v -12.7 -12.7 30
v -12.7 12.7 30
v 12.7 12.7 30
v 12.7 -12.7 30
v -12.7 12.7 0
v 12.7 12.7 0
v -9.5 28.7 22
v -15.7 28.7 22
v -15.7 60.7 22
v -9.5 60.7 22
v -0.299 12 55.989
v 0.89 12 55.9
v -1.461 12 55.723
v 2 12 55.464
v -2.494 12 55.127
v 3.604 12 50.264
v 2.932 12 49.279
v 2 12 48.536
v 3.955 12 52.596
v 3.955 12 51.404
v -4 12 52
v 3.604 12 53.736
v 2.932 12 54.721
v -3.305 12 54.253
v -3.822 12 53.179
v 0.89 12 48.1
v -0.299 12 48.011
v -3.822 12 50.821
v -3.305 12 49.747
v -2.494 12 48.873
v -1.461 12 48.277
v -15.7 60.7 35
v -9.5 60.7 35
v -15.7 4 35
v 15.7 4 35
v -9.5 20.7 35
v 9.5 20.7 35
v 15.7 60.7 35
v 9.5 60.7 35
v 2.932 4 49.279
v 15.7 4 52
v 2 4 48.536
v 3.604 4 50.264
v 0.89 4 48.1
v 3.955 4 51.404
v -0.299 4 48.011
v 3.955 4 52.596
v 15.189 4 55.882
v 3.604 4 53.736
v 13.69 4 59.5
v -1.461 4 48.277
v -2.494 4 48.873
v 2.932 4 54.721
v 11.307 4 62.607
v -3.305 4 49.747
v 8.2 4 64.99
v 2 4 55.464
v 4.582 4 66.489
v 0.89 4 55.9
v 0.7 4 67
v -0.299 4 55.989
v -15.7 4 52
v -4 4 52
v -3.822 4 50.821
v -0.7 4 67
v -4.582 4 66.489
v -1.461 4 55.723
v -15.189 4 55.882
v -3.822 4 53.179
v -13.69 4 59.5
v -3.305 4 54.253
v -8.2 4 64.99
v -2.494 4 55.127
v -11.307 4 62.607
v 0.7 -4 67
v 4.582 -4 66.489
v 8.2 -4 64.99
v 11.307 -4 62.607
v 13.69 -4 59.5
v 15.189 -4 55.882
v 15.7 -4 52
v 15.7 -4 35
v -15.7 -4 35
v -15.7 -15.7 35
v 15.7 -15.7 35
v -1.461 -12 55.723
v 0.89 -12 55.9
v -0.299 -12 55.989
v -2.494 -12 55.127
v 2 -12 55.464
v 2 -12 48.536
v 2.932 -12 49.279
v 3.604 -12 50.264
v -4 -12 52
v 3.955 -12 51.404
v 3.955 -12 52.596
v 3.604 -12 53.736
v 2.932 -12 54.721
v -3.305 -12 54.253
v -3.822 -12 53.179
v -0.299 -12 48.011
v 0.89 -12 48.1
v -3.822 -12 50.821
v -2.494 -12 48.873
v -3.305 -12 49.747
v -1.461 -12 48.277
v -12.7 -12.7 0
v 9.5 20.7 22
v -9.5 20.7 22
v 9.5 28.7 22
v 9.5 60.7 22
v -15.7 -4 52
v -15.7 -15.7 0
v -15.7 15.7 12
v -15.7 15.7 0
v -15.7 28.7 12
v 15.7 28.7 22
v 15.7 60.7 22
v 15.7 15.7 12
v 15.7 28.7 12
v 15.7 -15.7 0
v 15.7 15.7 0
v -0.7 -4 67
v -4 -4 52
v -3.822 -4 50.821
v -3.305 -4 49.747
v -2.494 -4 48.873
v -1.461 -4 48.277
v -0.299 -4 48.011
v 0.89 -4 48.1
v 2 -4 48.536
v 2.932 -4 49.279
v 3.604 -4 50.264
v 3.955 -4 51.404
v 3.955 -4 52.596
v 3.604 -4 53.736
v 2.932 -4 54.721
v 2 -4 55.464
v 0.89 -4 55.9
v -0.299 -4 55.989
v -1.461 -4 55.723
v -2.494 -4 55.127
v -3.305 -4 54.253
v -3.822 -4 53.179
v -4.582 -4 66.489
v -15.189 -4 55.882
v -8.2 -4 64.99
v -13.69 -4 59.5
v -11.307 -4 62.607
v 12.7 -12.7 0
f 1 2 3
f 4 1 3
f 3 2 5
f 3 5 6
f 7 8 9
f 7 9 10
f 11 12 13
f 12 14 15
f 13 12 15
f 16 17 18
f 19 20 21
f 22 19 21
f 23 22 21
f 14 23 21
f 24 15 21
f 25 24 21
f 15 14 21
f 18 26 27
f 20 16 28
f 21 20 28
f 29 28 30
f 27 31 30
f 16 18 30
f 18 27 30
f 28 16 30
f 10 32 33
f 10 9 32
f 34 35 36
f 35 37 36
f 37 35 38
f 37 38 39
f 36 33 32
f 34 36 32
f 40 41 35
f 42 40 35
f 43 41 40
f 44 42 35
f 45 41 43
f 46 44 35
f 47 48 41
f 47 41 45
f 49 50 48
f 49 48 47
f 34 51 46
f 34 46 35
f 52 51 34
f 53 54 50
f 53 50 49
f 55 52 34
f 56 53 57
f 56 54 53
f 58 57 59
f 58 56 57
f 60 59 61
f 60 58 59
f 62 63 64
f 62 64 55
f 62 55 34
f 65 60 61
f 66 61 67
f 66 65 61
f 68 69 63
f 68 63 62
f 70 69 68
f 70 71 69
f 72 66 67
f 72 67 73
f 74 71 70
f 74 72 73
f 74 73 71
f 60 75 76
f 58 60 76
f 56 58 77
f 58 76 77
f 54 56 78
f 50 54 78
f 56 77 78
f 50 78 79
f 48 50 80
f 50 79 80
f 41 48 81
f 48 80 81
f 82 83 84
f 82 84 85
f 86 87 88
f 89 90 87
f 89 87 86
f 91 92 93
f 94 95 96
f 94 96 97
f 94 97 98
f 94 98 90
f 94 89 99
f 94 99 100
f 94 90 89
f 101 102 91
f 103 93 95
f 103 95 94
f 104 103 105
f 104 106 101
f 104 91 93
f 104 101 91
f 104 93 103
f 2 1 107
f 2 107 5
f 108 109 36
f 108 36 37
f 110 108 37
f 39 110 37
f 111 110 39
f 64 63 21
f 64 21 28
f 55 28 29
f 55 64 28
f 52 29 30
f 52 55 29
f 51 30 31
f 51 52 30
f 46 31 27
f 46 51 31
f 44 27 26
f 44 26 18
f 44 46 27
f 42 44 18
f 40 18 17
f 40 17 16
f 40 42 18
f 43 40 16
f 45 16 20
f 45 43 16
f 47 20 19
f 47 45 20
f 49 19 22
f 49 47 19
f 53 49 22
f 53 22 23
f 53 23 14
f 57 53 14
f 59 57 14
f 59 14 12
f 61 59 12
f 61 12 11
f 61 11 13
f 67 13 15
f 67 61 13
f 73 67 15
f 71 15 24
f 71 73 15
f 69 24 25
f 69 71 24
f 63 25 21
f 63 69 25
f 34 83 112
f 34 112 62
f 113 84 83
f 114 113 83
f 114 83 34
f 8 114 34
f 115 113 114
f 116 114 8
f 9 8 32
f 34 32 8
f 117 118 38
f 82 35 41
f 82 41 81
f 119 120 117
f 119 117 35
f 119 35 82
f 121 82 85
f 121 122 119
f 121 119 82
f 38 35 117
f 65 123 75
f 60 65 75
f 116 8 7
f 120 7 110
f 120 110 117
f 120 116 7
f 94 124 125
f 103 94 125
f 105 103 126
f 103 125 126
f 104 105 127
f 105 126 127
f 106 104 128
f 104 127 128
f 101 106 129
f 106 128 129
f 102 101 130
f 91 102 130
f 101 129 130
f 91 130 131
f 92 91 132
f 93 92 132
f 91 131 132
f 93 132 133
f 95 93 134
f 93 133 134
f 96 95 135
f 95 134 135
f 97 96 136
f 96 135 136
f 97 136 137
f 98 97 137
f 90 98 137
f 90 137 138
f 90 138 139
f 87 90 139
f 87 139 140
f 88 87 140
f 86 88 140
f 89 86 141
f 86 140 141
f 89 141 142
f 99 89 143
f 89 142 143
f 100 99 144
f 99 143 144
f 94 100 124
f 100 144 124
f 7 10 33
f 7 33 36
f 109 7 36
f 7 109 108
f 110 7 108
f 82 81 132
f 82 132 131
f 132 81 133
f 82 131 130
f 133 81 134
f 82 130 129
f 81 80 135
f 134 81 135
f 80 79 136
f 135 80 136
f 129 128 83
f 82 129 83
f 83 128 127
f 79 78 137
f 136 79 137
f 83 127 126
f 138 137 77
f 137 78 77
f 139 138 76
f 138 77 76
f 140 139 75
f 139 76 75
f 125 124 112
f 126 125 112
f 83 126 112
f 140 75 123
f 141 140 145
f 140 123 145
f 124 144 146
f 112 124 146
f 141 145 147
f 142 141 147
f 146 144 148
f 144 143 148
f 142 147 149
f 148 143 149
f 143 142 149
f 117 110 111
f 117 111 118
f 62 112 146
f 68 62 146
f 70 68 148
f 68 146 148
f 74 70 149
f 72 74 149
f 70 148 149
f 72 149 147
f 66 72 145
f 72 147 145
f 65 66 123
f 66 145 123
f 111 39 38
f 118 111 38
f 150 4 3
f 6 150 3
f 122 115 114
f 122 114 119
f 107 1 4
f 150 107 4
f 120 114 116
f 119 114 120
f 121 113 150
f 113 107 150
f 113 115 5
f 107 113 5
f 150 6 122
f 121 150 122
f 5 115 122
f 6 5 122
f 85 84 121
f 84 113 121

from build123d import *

# Parameters (mm, degrees)
SKETCH4_W            = 31.4
SKETCH4_H            = 31.4
SKETCH4_W_2          = 25.4
SKETCH4_H_2          = 25.4
BOSS_EXTRUDE3_DEPTH  = 30
SKETCH5_W            = 31.4
SKETCH5_H            = 31.4
BOSS_EXTRUDE4_DEPTH  = 5
SKETCH6_W            = 31.4
SKETCH6_H            = 8
BOSS_EXTRUDE5_DEPTH  = 5
BOSS_EXTRUDE6_DEPTH  = 8
SKETCH8_R            = 4
BOSS_EXTRUDE7_DEPTH  = 8
SKETCH9_W            = 31.4
SKETCH9_H            = 10
BOSS_EXTRUDE8_DEPTH  = 5
SKETCH10_W           = 31.4
SKETCH10_H           = 10
BOSS_EXTRUDE9_DEPTH  = 13
SKETCH11_W           = 6.2
SKETCH11_H           = 10
BOSS_EXTRUDE10_DEPTH = 40
BOSS_EXTRUDE11_DEPTH = 3


with BuildPart() as part:
    # Sketch4 → Boss-Extrude3 (new body)
    with BuildSketch(Plane.XY):
        Rectangle(SKETCH4_W, SKETCH4_H)
        Rectangle(SKETCH4_W_2, SKETCH4_H_2, mode=Mode.SUBTRACT)
    extrude(amount=BOSS_EXTRUDE3_DEPTH)

    # Sketch5 → Boss-Extrude4 (add)
    with BuildSketch(Plane.XY.offset(30)):
        Rectangle(SKETCH5_W, SKETCH5_H)
    extrude(amount=BOSS_EXTRUDE4_DEPTH)

    # Sketch6 → Boss-Extrude5 (add)
    with BuildSketch(Plane.XY.offset(35)):
        Rectangle(SKETCH6_W, SKETCH6_H)
    extrude(amount=BOSS_EXTRUDE5_DEPTH)

    # Sketch7 → Boss-Extrude6 (add)
    with BuildSketch(Plane.XZ.offset(4)):
        with BuildLine():
            Line((-15.7, 40), (-15.7, 52))
            ThreePointArc((-15.7, 52), (-11.306601718, 62.606601718), (-0.7, 67))
            Line((-0.7, 67), (0.7, 67))
            ThreePointArc((0.7, 67), (11.306601718, 62.606601718), (15.7, 52))
            Line((15.7, 52), (15.7, 40))
            Line((15.7, 40), (-15.7, 40))
        make_face()
    extrude(amount=-BOSS_EXTRUDE6_DEPTH)

    # Sketch8 → Boss-Extrude7 (add)
    with BuildSketch(Plane.XZ.offset(4)):
        with Locations(Location((0, 52, 0), (0, 0, 180))):
            Circle(SKETCH8_R)
    boss_extrude7 = extrude(amount=BOSS_EXTRUDE7_DEPTH)

    # Mirror1: Boss-Extrude7 across plane
    add(boss_extrude7.mirror(Plane.ZX))

    # Sketch9 → Boss-Extrude8 (add)
    with BuildSketch(Plane(origin=(0, 15.7, 0), x_dir=(1, 0, 0), z_dir=(0, 1, 0))):
        with Locations((0, -27)):
            Rectangle(SKETCH9_W, SKETCH9_H)
    extrude(amount=BOSS_EXTRUDE8_DEPTH)

    # Sketch10 → Boss-Extrude9 (add)
    with BuildSketch(Plane(origin=(0, 15.7, 0), x_dir=(1, 0, 0), z_dir=(0, 1, 0))):
        with Locations((0, -17)):
            Rectangle(SKETCH10_W, SKETCH10_H)
    extrude(amount=BOSS_EXTRUDE9_DEPTH)

    # Sketch11 → Boss-Extrude10 (add)
    with BuildSketch(Plane(origin=(0, 20.7, 0), x_dir=(1, 0, 0), z_dir=(0, 1, 0))):
        with Locations((-12.6, -27)):
            Rectangle(SKETCH11_W, SKETCH11_H)
        with Locations((12.6, -27)):
            Rectangle(SKETCH11_W, SKETCH11_H)
    extrude(amount=BOSS_EXTRUDE10_DEPTH)

    # Sketch12 → Boss-Extrude11 (add)
    with BuildSketch(Plane.XY.offset(32)):
        Polygon((-15.7, 60.7), (-9.5, 60.7), (-9.5, 20.7), (9.5, 20.7), (9.5, 60.7), (15.7, 60.7), (15.7, 15.7), (-15.7, 15.7), align=None)
    extrude(amount=BOSS_EXTRUDE11_DEPTH)


solid = part.part
